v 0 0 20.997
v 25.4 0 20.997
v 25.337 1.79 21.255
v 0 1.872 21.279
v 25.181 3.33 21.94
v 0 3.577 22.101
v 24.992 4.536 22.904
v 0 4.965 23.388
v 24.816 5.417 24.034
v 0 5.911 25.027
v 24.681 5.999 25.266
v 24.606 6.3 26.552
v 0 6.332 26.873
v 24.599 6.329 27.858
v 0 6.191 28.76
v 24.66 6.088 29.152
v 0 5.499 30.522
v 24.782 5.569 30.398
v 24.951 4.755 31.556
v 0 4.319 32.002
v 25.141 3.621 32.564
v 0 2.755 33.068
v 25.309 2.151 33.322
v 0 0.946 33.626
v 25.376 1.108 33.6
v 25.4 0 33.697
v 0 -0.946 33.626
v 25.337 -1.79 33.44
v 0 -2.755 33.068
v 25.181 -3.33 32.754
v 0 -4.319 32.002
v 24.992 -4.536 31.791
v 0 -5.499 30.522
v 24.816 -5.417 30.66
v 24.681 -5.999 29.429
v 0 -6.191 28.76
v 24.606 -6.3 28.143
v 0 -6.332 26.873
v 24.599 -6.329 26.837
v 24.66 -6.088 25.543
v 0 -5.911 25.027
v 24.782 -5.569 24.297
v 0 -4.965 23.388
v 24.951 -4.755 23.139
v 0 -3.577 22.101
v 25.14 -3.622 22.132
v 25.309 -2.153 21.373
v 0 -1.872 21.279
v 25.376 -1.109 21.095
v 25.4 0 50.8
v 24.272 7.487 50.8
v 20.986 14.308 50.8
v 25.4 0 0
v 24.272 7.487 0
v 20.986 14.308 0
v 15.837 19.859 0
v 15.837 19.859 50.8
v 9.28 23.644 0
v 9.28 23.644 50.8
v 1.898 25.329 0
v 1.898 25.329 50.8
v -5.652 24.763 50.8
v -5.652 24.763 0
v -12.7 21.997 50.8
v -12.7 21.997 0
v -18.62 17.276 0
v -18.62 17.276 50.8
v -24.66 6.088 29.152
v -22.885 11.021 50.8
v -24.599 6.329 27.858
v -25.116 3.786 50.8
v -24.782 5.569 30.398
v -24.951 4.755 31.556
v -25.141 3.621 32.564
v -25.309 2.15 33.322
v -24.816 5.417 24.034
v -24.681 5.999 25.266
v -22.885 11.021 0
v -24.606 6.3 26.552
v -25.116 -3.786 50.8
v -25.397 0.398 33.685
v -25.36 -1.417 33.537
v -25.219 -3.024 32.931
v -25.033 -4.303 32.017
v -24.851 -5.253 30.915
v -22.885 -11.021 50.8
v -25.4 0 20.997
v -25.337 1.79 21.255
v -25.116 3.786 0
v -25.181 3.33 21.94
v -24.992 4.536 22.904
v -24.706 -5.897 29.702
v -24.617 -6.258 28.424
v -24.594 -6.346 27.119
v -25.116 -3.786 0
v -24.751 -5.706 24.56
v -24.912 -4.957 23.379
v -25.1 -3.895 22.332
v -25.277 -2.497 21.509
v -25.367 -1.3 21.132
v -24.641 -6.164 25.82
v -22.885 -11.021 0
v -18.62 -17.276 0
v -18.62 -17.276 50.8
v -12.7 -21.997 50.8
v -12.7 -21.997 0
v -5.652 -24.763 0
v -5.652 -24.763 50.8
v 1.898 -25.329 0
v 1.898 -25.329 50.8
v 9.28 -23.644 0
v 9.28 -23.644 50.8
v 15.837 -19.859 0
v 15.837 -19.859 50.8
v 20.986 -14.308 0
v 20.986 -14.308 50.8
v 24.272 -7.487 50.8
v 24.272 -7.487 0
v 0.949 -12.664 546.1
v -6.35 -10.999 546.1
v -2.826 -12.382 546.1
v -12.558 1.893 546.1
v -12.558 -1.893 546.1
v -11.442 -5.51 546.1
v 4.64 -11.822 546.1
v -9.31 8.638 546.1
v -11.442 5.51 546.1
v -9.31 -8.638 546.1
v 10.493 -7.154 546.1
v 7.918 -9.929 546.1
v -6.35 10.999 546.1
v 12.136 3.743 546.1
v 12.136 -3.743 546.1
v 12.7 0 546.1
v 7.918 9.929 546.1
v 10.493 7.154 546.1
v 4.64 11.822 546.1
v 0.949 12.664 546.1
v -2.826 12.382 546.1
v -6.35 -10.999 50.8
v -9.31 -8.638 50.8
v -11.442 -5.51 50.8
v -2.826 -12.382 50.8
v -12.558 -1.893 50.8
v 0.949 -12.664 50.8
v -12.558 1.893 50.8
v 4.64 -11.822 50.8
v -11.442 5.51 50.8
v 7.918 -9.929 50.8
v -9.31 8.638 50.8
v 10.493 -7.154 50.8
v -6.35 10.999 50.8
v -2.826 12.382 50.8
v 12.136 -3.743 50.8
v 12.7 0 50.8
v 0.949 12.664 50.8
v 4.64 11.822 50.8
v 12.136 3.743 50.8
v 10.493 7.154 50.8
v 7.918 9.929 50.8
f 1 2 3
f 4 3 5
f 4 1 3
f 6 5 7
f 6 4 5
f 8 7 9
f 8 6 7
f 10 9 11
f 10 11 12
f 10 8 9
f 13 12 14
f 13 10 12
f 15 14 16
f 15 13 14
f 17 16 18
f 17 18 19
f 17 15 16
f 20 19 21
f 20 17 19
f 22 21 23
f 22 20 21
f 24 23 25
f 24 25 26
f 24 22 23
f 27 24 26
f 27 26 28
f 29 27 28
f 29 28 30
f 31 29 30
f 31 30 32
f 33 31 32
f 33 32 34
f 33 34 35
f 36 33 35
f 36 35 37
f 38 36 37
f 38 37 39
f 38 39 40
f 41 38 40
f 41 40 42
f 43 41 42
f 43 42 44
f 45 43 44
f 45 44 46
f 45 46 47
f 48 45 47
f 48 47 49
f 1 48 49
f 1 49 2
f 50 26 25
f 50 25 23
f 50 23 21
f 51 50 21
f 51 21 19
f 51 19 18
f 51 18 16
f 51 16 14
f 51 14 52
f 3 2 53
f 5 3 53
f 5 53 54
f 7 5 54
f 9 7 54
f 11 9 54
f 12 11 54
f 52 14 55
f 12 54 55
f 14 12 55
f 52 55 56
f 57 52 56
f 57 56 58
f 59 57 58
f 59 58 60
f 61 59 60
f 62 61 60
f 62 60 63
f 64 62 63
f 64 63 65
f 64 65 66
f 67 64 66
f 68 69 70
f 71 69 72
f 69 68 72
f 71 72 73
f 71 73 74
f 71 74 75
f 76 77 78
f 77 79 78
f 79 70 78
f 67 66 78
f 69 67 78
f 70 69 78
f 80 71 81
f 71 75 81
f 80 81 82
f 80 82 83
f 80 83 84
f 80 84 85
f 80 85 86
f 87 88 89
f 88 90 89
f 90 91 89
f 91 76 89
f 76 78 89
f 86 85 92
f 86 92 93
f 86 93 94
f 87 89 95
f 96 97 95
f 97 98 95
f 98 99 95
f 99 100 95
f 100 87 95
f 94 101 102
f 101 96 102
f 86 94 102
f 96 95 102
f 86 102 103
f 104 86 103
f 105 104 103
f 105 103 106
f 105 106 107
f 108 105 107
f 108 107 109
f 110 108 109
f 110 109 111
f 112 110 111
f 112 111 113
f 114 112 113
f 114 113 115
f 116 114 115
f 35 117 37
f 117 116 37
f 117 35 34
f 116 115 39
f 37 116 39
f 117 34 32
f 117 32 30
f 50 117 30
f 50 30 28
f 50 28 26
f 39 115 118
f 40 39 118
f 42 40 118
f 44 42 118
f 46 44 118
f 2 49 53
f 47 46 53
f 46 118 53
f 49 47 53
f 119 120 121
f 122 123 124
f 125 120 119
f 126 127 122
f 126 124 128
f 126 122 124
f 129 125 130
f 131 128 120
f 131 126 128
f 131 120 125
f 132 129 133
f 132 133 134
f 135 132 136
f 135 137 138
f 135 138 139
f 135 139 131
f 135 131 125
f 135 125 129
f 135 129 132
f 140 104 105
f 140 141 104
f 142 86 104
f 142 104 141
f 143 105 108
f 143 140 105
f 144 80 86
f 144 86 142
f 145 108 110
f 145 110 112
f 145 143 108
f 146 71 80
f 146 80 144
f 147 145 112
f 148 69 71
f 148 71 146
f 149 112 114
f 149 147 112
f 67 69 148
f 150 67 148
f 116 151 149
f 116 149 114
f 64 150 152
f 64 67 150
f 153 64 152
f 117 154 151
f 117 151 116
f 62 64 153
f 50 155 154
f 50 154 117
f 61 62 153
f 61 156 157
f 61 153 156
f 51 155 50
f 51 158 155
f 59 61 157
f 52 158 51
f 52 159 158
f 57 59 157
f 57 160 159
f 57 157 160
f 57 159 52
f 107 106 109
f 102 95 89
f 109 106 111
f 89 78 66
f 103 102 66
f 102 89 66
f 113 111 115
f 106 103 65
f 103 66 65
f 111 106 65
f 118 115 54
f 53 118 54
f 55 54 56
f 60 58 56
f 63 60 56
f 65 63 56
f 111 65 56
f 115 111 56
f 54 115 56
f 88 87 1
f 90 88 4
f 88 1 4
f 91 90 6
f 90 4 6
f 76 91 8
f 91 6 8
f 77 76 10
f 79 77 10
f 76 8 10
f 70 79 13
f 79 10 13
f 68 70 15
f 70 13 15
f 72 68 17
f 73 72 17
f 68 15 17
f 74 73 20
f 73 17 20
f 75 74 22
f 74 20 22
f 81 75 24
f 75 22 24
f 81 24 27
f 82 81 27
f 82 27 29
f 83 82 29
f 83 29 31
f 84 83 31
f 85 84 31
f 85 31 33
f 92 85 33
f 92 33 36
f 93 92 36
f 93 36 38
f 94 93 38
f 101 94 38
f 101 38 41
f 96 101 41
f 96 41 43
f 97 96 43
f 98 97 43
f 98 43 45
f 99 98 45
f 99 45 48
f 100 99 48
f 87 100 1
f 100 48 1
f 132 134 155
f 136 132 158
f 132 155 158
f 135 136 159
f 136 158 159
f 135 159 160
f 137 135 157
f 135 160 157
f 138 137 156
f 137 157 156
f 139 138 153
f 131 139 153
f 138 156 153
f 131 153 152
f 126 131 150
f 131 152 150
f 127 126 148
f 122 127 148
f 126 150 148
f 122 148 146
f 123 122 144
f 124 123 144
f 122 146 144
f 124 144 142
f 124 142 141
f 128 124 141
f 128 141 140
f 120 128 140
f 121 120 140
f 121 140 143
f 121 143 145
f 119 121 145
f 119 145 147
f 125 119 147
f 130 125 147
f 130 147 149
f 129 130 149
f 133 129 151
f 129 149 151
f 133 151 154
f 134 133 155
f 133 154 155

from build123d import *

# Parameters (mm, degrees)
SKETCH1_R               = 25.4
EXTRUDE1_DEPTH          = 50.8
SKETCH2_R               = 12.7
EXTRUDE2_DEPTH          = 495.3
SKETCH3_R               = 6.35
CUT_EXTRUDE1_DEPTH      = 26.4
CUT_EXTRUDE1_DEPTH_BACK = 26.4


with BuildPart() as part:
    # Sketch1 → Extrude1 (new body)
    with BuildSketch(Plane.XY):
        Circle(SKETCH1_R)
    extrude(amount=EXTRUDE1_DEPTH)

    # Sketch2 → Extrude2 (add)
    with BuildSketch(Plane.XY.offset(50.8)):
        Circle(SKETCH2_R)
    extrude(amount=EXTRUDE2_DEPTH)

    # Sketch3 → Cut-Extrude1 (cut, two sides)
    with BuildSketch(Plane(origin=(0, 0, 0), x_dir=(0, 0, -1), z_dir=(1, 0, 0))) as cut_extrude1_sk:
        with Locations((-27.347285404, 0)):
            Circle(SKETCH3_R)
    extrude(amount=CUT_EXTRUDE1_DEPTH, mode=Mode.SUBTRACT)
    extrude(cut_extrude1_sk.sketch, amount=-CUT_EXTRUDE1_DEPTH_BACK, mode=Mode.SUBTRACT)


solid = part.part
